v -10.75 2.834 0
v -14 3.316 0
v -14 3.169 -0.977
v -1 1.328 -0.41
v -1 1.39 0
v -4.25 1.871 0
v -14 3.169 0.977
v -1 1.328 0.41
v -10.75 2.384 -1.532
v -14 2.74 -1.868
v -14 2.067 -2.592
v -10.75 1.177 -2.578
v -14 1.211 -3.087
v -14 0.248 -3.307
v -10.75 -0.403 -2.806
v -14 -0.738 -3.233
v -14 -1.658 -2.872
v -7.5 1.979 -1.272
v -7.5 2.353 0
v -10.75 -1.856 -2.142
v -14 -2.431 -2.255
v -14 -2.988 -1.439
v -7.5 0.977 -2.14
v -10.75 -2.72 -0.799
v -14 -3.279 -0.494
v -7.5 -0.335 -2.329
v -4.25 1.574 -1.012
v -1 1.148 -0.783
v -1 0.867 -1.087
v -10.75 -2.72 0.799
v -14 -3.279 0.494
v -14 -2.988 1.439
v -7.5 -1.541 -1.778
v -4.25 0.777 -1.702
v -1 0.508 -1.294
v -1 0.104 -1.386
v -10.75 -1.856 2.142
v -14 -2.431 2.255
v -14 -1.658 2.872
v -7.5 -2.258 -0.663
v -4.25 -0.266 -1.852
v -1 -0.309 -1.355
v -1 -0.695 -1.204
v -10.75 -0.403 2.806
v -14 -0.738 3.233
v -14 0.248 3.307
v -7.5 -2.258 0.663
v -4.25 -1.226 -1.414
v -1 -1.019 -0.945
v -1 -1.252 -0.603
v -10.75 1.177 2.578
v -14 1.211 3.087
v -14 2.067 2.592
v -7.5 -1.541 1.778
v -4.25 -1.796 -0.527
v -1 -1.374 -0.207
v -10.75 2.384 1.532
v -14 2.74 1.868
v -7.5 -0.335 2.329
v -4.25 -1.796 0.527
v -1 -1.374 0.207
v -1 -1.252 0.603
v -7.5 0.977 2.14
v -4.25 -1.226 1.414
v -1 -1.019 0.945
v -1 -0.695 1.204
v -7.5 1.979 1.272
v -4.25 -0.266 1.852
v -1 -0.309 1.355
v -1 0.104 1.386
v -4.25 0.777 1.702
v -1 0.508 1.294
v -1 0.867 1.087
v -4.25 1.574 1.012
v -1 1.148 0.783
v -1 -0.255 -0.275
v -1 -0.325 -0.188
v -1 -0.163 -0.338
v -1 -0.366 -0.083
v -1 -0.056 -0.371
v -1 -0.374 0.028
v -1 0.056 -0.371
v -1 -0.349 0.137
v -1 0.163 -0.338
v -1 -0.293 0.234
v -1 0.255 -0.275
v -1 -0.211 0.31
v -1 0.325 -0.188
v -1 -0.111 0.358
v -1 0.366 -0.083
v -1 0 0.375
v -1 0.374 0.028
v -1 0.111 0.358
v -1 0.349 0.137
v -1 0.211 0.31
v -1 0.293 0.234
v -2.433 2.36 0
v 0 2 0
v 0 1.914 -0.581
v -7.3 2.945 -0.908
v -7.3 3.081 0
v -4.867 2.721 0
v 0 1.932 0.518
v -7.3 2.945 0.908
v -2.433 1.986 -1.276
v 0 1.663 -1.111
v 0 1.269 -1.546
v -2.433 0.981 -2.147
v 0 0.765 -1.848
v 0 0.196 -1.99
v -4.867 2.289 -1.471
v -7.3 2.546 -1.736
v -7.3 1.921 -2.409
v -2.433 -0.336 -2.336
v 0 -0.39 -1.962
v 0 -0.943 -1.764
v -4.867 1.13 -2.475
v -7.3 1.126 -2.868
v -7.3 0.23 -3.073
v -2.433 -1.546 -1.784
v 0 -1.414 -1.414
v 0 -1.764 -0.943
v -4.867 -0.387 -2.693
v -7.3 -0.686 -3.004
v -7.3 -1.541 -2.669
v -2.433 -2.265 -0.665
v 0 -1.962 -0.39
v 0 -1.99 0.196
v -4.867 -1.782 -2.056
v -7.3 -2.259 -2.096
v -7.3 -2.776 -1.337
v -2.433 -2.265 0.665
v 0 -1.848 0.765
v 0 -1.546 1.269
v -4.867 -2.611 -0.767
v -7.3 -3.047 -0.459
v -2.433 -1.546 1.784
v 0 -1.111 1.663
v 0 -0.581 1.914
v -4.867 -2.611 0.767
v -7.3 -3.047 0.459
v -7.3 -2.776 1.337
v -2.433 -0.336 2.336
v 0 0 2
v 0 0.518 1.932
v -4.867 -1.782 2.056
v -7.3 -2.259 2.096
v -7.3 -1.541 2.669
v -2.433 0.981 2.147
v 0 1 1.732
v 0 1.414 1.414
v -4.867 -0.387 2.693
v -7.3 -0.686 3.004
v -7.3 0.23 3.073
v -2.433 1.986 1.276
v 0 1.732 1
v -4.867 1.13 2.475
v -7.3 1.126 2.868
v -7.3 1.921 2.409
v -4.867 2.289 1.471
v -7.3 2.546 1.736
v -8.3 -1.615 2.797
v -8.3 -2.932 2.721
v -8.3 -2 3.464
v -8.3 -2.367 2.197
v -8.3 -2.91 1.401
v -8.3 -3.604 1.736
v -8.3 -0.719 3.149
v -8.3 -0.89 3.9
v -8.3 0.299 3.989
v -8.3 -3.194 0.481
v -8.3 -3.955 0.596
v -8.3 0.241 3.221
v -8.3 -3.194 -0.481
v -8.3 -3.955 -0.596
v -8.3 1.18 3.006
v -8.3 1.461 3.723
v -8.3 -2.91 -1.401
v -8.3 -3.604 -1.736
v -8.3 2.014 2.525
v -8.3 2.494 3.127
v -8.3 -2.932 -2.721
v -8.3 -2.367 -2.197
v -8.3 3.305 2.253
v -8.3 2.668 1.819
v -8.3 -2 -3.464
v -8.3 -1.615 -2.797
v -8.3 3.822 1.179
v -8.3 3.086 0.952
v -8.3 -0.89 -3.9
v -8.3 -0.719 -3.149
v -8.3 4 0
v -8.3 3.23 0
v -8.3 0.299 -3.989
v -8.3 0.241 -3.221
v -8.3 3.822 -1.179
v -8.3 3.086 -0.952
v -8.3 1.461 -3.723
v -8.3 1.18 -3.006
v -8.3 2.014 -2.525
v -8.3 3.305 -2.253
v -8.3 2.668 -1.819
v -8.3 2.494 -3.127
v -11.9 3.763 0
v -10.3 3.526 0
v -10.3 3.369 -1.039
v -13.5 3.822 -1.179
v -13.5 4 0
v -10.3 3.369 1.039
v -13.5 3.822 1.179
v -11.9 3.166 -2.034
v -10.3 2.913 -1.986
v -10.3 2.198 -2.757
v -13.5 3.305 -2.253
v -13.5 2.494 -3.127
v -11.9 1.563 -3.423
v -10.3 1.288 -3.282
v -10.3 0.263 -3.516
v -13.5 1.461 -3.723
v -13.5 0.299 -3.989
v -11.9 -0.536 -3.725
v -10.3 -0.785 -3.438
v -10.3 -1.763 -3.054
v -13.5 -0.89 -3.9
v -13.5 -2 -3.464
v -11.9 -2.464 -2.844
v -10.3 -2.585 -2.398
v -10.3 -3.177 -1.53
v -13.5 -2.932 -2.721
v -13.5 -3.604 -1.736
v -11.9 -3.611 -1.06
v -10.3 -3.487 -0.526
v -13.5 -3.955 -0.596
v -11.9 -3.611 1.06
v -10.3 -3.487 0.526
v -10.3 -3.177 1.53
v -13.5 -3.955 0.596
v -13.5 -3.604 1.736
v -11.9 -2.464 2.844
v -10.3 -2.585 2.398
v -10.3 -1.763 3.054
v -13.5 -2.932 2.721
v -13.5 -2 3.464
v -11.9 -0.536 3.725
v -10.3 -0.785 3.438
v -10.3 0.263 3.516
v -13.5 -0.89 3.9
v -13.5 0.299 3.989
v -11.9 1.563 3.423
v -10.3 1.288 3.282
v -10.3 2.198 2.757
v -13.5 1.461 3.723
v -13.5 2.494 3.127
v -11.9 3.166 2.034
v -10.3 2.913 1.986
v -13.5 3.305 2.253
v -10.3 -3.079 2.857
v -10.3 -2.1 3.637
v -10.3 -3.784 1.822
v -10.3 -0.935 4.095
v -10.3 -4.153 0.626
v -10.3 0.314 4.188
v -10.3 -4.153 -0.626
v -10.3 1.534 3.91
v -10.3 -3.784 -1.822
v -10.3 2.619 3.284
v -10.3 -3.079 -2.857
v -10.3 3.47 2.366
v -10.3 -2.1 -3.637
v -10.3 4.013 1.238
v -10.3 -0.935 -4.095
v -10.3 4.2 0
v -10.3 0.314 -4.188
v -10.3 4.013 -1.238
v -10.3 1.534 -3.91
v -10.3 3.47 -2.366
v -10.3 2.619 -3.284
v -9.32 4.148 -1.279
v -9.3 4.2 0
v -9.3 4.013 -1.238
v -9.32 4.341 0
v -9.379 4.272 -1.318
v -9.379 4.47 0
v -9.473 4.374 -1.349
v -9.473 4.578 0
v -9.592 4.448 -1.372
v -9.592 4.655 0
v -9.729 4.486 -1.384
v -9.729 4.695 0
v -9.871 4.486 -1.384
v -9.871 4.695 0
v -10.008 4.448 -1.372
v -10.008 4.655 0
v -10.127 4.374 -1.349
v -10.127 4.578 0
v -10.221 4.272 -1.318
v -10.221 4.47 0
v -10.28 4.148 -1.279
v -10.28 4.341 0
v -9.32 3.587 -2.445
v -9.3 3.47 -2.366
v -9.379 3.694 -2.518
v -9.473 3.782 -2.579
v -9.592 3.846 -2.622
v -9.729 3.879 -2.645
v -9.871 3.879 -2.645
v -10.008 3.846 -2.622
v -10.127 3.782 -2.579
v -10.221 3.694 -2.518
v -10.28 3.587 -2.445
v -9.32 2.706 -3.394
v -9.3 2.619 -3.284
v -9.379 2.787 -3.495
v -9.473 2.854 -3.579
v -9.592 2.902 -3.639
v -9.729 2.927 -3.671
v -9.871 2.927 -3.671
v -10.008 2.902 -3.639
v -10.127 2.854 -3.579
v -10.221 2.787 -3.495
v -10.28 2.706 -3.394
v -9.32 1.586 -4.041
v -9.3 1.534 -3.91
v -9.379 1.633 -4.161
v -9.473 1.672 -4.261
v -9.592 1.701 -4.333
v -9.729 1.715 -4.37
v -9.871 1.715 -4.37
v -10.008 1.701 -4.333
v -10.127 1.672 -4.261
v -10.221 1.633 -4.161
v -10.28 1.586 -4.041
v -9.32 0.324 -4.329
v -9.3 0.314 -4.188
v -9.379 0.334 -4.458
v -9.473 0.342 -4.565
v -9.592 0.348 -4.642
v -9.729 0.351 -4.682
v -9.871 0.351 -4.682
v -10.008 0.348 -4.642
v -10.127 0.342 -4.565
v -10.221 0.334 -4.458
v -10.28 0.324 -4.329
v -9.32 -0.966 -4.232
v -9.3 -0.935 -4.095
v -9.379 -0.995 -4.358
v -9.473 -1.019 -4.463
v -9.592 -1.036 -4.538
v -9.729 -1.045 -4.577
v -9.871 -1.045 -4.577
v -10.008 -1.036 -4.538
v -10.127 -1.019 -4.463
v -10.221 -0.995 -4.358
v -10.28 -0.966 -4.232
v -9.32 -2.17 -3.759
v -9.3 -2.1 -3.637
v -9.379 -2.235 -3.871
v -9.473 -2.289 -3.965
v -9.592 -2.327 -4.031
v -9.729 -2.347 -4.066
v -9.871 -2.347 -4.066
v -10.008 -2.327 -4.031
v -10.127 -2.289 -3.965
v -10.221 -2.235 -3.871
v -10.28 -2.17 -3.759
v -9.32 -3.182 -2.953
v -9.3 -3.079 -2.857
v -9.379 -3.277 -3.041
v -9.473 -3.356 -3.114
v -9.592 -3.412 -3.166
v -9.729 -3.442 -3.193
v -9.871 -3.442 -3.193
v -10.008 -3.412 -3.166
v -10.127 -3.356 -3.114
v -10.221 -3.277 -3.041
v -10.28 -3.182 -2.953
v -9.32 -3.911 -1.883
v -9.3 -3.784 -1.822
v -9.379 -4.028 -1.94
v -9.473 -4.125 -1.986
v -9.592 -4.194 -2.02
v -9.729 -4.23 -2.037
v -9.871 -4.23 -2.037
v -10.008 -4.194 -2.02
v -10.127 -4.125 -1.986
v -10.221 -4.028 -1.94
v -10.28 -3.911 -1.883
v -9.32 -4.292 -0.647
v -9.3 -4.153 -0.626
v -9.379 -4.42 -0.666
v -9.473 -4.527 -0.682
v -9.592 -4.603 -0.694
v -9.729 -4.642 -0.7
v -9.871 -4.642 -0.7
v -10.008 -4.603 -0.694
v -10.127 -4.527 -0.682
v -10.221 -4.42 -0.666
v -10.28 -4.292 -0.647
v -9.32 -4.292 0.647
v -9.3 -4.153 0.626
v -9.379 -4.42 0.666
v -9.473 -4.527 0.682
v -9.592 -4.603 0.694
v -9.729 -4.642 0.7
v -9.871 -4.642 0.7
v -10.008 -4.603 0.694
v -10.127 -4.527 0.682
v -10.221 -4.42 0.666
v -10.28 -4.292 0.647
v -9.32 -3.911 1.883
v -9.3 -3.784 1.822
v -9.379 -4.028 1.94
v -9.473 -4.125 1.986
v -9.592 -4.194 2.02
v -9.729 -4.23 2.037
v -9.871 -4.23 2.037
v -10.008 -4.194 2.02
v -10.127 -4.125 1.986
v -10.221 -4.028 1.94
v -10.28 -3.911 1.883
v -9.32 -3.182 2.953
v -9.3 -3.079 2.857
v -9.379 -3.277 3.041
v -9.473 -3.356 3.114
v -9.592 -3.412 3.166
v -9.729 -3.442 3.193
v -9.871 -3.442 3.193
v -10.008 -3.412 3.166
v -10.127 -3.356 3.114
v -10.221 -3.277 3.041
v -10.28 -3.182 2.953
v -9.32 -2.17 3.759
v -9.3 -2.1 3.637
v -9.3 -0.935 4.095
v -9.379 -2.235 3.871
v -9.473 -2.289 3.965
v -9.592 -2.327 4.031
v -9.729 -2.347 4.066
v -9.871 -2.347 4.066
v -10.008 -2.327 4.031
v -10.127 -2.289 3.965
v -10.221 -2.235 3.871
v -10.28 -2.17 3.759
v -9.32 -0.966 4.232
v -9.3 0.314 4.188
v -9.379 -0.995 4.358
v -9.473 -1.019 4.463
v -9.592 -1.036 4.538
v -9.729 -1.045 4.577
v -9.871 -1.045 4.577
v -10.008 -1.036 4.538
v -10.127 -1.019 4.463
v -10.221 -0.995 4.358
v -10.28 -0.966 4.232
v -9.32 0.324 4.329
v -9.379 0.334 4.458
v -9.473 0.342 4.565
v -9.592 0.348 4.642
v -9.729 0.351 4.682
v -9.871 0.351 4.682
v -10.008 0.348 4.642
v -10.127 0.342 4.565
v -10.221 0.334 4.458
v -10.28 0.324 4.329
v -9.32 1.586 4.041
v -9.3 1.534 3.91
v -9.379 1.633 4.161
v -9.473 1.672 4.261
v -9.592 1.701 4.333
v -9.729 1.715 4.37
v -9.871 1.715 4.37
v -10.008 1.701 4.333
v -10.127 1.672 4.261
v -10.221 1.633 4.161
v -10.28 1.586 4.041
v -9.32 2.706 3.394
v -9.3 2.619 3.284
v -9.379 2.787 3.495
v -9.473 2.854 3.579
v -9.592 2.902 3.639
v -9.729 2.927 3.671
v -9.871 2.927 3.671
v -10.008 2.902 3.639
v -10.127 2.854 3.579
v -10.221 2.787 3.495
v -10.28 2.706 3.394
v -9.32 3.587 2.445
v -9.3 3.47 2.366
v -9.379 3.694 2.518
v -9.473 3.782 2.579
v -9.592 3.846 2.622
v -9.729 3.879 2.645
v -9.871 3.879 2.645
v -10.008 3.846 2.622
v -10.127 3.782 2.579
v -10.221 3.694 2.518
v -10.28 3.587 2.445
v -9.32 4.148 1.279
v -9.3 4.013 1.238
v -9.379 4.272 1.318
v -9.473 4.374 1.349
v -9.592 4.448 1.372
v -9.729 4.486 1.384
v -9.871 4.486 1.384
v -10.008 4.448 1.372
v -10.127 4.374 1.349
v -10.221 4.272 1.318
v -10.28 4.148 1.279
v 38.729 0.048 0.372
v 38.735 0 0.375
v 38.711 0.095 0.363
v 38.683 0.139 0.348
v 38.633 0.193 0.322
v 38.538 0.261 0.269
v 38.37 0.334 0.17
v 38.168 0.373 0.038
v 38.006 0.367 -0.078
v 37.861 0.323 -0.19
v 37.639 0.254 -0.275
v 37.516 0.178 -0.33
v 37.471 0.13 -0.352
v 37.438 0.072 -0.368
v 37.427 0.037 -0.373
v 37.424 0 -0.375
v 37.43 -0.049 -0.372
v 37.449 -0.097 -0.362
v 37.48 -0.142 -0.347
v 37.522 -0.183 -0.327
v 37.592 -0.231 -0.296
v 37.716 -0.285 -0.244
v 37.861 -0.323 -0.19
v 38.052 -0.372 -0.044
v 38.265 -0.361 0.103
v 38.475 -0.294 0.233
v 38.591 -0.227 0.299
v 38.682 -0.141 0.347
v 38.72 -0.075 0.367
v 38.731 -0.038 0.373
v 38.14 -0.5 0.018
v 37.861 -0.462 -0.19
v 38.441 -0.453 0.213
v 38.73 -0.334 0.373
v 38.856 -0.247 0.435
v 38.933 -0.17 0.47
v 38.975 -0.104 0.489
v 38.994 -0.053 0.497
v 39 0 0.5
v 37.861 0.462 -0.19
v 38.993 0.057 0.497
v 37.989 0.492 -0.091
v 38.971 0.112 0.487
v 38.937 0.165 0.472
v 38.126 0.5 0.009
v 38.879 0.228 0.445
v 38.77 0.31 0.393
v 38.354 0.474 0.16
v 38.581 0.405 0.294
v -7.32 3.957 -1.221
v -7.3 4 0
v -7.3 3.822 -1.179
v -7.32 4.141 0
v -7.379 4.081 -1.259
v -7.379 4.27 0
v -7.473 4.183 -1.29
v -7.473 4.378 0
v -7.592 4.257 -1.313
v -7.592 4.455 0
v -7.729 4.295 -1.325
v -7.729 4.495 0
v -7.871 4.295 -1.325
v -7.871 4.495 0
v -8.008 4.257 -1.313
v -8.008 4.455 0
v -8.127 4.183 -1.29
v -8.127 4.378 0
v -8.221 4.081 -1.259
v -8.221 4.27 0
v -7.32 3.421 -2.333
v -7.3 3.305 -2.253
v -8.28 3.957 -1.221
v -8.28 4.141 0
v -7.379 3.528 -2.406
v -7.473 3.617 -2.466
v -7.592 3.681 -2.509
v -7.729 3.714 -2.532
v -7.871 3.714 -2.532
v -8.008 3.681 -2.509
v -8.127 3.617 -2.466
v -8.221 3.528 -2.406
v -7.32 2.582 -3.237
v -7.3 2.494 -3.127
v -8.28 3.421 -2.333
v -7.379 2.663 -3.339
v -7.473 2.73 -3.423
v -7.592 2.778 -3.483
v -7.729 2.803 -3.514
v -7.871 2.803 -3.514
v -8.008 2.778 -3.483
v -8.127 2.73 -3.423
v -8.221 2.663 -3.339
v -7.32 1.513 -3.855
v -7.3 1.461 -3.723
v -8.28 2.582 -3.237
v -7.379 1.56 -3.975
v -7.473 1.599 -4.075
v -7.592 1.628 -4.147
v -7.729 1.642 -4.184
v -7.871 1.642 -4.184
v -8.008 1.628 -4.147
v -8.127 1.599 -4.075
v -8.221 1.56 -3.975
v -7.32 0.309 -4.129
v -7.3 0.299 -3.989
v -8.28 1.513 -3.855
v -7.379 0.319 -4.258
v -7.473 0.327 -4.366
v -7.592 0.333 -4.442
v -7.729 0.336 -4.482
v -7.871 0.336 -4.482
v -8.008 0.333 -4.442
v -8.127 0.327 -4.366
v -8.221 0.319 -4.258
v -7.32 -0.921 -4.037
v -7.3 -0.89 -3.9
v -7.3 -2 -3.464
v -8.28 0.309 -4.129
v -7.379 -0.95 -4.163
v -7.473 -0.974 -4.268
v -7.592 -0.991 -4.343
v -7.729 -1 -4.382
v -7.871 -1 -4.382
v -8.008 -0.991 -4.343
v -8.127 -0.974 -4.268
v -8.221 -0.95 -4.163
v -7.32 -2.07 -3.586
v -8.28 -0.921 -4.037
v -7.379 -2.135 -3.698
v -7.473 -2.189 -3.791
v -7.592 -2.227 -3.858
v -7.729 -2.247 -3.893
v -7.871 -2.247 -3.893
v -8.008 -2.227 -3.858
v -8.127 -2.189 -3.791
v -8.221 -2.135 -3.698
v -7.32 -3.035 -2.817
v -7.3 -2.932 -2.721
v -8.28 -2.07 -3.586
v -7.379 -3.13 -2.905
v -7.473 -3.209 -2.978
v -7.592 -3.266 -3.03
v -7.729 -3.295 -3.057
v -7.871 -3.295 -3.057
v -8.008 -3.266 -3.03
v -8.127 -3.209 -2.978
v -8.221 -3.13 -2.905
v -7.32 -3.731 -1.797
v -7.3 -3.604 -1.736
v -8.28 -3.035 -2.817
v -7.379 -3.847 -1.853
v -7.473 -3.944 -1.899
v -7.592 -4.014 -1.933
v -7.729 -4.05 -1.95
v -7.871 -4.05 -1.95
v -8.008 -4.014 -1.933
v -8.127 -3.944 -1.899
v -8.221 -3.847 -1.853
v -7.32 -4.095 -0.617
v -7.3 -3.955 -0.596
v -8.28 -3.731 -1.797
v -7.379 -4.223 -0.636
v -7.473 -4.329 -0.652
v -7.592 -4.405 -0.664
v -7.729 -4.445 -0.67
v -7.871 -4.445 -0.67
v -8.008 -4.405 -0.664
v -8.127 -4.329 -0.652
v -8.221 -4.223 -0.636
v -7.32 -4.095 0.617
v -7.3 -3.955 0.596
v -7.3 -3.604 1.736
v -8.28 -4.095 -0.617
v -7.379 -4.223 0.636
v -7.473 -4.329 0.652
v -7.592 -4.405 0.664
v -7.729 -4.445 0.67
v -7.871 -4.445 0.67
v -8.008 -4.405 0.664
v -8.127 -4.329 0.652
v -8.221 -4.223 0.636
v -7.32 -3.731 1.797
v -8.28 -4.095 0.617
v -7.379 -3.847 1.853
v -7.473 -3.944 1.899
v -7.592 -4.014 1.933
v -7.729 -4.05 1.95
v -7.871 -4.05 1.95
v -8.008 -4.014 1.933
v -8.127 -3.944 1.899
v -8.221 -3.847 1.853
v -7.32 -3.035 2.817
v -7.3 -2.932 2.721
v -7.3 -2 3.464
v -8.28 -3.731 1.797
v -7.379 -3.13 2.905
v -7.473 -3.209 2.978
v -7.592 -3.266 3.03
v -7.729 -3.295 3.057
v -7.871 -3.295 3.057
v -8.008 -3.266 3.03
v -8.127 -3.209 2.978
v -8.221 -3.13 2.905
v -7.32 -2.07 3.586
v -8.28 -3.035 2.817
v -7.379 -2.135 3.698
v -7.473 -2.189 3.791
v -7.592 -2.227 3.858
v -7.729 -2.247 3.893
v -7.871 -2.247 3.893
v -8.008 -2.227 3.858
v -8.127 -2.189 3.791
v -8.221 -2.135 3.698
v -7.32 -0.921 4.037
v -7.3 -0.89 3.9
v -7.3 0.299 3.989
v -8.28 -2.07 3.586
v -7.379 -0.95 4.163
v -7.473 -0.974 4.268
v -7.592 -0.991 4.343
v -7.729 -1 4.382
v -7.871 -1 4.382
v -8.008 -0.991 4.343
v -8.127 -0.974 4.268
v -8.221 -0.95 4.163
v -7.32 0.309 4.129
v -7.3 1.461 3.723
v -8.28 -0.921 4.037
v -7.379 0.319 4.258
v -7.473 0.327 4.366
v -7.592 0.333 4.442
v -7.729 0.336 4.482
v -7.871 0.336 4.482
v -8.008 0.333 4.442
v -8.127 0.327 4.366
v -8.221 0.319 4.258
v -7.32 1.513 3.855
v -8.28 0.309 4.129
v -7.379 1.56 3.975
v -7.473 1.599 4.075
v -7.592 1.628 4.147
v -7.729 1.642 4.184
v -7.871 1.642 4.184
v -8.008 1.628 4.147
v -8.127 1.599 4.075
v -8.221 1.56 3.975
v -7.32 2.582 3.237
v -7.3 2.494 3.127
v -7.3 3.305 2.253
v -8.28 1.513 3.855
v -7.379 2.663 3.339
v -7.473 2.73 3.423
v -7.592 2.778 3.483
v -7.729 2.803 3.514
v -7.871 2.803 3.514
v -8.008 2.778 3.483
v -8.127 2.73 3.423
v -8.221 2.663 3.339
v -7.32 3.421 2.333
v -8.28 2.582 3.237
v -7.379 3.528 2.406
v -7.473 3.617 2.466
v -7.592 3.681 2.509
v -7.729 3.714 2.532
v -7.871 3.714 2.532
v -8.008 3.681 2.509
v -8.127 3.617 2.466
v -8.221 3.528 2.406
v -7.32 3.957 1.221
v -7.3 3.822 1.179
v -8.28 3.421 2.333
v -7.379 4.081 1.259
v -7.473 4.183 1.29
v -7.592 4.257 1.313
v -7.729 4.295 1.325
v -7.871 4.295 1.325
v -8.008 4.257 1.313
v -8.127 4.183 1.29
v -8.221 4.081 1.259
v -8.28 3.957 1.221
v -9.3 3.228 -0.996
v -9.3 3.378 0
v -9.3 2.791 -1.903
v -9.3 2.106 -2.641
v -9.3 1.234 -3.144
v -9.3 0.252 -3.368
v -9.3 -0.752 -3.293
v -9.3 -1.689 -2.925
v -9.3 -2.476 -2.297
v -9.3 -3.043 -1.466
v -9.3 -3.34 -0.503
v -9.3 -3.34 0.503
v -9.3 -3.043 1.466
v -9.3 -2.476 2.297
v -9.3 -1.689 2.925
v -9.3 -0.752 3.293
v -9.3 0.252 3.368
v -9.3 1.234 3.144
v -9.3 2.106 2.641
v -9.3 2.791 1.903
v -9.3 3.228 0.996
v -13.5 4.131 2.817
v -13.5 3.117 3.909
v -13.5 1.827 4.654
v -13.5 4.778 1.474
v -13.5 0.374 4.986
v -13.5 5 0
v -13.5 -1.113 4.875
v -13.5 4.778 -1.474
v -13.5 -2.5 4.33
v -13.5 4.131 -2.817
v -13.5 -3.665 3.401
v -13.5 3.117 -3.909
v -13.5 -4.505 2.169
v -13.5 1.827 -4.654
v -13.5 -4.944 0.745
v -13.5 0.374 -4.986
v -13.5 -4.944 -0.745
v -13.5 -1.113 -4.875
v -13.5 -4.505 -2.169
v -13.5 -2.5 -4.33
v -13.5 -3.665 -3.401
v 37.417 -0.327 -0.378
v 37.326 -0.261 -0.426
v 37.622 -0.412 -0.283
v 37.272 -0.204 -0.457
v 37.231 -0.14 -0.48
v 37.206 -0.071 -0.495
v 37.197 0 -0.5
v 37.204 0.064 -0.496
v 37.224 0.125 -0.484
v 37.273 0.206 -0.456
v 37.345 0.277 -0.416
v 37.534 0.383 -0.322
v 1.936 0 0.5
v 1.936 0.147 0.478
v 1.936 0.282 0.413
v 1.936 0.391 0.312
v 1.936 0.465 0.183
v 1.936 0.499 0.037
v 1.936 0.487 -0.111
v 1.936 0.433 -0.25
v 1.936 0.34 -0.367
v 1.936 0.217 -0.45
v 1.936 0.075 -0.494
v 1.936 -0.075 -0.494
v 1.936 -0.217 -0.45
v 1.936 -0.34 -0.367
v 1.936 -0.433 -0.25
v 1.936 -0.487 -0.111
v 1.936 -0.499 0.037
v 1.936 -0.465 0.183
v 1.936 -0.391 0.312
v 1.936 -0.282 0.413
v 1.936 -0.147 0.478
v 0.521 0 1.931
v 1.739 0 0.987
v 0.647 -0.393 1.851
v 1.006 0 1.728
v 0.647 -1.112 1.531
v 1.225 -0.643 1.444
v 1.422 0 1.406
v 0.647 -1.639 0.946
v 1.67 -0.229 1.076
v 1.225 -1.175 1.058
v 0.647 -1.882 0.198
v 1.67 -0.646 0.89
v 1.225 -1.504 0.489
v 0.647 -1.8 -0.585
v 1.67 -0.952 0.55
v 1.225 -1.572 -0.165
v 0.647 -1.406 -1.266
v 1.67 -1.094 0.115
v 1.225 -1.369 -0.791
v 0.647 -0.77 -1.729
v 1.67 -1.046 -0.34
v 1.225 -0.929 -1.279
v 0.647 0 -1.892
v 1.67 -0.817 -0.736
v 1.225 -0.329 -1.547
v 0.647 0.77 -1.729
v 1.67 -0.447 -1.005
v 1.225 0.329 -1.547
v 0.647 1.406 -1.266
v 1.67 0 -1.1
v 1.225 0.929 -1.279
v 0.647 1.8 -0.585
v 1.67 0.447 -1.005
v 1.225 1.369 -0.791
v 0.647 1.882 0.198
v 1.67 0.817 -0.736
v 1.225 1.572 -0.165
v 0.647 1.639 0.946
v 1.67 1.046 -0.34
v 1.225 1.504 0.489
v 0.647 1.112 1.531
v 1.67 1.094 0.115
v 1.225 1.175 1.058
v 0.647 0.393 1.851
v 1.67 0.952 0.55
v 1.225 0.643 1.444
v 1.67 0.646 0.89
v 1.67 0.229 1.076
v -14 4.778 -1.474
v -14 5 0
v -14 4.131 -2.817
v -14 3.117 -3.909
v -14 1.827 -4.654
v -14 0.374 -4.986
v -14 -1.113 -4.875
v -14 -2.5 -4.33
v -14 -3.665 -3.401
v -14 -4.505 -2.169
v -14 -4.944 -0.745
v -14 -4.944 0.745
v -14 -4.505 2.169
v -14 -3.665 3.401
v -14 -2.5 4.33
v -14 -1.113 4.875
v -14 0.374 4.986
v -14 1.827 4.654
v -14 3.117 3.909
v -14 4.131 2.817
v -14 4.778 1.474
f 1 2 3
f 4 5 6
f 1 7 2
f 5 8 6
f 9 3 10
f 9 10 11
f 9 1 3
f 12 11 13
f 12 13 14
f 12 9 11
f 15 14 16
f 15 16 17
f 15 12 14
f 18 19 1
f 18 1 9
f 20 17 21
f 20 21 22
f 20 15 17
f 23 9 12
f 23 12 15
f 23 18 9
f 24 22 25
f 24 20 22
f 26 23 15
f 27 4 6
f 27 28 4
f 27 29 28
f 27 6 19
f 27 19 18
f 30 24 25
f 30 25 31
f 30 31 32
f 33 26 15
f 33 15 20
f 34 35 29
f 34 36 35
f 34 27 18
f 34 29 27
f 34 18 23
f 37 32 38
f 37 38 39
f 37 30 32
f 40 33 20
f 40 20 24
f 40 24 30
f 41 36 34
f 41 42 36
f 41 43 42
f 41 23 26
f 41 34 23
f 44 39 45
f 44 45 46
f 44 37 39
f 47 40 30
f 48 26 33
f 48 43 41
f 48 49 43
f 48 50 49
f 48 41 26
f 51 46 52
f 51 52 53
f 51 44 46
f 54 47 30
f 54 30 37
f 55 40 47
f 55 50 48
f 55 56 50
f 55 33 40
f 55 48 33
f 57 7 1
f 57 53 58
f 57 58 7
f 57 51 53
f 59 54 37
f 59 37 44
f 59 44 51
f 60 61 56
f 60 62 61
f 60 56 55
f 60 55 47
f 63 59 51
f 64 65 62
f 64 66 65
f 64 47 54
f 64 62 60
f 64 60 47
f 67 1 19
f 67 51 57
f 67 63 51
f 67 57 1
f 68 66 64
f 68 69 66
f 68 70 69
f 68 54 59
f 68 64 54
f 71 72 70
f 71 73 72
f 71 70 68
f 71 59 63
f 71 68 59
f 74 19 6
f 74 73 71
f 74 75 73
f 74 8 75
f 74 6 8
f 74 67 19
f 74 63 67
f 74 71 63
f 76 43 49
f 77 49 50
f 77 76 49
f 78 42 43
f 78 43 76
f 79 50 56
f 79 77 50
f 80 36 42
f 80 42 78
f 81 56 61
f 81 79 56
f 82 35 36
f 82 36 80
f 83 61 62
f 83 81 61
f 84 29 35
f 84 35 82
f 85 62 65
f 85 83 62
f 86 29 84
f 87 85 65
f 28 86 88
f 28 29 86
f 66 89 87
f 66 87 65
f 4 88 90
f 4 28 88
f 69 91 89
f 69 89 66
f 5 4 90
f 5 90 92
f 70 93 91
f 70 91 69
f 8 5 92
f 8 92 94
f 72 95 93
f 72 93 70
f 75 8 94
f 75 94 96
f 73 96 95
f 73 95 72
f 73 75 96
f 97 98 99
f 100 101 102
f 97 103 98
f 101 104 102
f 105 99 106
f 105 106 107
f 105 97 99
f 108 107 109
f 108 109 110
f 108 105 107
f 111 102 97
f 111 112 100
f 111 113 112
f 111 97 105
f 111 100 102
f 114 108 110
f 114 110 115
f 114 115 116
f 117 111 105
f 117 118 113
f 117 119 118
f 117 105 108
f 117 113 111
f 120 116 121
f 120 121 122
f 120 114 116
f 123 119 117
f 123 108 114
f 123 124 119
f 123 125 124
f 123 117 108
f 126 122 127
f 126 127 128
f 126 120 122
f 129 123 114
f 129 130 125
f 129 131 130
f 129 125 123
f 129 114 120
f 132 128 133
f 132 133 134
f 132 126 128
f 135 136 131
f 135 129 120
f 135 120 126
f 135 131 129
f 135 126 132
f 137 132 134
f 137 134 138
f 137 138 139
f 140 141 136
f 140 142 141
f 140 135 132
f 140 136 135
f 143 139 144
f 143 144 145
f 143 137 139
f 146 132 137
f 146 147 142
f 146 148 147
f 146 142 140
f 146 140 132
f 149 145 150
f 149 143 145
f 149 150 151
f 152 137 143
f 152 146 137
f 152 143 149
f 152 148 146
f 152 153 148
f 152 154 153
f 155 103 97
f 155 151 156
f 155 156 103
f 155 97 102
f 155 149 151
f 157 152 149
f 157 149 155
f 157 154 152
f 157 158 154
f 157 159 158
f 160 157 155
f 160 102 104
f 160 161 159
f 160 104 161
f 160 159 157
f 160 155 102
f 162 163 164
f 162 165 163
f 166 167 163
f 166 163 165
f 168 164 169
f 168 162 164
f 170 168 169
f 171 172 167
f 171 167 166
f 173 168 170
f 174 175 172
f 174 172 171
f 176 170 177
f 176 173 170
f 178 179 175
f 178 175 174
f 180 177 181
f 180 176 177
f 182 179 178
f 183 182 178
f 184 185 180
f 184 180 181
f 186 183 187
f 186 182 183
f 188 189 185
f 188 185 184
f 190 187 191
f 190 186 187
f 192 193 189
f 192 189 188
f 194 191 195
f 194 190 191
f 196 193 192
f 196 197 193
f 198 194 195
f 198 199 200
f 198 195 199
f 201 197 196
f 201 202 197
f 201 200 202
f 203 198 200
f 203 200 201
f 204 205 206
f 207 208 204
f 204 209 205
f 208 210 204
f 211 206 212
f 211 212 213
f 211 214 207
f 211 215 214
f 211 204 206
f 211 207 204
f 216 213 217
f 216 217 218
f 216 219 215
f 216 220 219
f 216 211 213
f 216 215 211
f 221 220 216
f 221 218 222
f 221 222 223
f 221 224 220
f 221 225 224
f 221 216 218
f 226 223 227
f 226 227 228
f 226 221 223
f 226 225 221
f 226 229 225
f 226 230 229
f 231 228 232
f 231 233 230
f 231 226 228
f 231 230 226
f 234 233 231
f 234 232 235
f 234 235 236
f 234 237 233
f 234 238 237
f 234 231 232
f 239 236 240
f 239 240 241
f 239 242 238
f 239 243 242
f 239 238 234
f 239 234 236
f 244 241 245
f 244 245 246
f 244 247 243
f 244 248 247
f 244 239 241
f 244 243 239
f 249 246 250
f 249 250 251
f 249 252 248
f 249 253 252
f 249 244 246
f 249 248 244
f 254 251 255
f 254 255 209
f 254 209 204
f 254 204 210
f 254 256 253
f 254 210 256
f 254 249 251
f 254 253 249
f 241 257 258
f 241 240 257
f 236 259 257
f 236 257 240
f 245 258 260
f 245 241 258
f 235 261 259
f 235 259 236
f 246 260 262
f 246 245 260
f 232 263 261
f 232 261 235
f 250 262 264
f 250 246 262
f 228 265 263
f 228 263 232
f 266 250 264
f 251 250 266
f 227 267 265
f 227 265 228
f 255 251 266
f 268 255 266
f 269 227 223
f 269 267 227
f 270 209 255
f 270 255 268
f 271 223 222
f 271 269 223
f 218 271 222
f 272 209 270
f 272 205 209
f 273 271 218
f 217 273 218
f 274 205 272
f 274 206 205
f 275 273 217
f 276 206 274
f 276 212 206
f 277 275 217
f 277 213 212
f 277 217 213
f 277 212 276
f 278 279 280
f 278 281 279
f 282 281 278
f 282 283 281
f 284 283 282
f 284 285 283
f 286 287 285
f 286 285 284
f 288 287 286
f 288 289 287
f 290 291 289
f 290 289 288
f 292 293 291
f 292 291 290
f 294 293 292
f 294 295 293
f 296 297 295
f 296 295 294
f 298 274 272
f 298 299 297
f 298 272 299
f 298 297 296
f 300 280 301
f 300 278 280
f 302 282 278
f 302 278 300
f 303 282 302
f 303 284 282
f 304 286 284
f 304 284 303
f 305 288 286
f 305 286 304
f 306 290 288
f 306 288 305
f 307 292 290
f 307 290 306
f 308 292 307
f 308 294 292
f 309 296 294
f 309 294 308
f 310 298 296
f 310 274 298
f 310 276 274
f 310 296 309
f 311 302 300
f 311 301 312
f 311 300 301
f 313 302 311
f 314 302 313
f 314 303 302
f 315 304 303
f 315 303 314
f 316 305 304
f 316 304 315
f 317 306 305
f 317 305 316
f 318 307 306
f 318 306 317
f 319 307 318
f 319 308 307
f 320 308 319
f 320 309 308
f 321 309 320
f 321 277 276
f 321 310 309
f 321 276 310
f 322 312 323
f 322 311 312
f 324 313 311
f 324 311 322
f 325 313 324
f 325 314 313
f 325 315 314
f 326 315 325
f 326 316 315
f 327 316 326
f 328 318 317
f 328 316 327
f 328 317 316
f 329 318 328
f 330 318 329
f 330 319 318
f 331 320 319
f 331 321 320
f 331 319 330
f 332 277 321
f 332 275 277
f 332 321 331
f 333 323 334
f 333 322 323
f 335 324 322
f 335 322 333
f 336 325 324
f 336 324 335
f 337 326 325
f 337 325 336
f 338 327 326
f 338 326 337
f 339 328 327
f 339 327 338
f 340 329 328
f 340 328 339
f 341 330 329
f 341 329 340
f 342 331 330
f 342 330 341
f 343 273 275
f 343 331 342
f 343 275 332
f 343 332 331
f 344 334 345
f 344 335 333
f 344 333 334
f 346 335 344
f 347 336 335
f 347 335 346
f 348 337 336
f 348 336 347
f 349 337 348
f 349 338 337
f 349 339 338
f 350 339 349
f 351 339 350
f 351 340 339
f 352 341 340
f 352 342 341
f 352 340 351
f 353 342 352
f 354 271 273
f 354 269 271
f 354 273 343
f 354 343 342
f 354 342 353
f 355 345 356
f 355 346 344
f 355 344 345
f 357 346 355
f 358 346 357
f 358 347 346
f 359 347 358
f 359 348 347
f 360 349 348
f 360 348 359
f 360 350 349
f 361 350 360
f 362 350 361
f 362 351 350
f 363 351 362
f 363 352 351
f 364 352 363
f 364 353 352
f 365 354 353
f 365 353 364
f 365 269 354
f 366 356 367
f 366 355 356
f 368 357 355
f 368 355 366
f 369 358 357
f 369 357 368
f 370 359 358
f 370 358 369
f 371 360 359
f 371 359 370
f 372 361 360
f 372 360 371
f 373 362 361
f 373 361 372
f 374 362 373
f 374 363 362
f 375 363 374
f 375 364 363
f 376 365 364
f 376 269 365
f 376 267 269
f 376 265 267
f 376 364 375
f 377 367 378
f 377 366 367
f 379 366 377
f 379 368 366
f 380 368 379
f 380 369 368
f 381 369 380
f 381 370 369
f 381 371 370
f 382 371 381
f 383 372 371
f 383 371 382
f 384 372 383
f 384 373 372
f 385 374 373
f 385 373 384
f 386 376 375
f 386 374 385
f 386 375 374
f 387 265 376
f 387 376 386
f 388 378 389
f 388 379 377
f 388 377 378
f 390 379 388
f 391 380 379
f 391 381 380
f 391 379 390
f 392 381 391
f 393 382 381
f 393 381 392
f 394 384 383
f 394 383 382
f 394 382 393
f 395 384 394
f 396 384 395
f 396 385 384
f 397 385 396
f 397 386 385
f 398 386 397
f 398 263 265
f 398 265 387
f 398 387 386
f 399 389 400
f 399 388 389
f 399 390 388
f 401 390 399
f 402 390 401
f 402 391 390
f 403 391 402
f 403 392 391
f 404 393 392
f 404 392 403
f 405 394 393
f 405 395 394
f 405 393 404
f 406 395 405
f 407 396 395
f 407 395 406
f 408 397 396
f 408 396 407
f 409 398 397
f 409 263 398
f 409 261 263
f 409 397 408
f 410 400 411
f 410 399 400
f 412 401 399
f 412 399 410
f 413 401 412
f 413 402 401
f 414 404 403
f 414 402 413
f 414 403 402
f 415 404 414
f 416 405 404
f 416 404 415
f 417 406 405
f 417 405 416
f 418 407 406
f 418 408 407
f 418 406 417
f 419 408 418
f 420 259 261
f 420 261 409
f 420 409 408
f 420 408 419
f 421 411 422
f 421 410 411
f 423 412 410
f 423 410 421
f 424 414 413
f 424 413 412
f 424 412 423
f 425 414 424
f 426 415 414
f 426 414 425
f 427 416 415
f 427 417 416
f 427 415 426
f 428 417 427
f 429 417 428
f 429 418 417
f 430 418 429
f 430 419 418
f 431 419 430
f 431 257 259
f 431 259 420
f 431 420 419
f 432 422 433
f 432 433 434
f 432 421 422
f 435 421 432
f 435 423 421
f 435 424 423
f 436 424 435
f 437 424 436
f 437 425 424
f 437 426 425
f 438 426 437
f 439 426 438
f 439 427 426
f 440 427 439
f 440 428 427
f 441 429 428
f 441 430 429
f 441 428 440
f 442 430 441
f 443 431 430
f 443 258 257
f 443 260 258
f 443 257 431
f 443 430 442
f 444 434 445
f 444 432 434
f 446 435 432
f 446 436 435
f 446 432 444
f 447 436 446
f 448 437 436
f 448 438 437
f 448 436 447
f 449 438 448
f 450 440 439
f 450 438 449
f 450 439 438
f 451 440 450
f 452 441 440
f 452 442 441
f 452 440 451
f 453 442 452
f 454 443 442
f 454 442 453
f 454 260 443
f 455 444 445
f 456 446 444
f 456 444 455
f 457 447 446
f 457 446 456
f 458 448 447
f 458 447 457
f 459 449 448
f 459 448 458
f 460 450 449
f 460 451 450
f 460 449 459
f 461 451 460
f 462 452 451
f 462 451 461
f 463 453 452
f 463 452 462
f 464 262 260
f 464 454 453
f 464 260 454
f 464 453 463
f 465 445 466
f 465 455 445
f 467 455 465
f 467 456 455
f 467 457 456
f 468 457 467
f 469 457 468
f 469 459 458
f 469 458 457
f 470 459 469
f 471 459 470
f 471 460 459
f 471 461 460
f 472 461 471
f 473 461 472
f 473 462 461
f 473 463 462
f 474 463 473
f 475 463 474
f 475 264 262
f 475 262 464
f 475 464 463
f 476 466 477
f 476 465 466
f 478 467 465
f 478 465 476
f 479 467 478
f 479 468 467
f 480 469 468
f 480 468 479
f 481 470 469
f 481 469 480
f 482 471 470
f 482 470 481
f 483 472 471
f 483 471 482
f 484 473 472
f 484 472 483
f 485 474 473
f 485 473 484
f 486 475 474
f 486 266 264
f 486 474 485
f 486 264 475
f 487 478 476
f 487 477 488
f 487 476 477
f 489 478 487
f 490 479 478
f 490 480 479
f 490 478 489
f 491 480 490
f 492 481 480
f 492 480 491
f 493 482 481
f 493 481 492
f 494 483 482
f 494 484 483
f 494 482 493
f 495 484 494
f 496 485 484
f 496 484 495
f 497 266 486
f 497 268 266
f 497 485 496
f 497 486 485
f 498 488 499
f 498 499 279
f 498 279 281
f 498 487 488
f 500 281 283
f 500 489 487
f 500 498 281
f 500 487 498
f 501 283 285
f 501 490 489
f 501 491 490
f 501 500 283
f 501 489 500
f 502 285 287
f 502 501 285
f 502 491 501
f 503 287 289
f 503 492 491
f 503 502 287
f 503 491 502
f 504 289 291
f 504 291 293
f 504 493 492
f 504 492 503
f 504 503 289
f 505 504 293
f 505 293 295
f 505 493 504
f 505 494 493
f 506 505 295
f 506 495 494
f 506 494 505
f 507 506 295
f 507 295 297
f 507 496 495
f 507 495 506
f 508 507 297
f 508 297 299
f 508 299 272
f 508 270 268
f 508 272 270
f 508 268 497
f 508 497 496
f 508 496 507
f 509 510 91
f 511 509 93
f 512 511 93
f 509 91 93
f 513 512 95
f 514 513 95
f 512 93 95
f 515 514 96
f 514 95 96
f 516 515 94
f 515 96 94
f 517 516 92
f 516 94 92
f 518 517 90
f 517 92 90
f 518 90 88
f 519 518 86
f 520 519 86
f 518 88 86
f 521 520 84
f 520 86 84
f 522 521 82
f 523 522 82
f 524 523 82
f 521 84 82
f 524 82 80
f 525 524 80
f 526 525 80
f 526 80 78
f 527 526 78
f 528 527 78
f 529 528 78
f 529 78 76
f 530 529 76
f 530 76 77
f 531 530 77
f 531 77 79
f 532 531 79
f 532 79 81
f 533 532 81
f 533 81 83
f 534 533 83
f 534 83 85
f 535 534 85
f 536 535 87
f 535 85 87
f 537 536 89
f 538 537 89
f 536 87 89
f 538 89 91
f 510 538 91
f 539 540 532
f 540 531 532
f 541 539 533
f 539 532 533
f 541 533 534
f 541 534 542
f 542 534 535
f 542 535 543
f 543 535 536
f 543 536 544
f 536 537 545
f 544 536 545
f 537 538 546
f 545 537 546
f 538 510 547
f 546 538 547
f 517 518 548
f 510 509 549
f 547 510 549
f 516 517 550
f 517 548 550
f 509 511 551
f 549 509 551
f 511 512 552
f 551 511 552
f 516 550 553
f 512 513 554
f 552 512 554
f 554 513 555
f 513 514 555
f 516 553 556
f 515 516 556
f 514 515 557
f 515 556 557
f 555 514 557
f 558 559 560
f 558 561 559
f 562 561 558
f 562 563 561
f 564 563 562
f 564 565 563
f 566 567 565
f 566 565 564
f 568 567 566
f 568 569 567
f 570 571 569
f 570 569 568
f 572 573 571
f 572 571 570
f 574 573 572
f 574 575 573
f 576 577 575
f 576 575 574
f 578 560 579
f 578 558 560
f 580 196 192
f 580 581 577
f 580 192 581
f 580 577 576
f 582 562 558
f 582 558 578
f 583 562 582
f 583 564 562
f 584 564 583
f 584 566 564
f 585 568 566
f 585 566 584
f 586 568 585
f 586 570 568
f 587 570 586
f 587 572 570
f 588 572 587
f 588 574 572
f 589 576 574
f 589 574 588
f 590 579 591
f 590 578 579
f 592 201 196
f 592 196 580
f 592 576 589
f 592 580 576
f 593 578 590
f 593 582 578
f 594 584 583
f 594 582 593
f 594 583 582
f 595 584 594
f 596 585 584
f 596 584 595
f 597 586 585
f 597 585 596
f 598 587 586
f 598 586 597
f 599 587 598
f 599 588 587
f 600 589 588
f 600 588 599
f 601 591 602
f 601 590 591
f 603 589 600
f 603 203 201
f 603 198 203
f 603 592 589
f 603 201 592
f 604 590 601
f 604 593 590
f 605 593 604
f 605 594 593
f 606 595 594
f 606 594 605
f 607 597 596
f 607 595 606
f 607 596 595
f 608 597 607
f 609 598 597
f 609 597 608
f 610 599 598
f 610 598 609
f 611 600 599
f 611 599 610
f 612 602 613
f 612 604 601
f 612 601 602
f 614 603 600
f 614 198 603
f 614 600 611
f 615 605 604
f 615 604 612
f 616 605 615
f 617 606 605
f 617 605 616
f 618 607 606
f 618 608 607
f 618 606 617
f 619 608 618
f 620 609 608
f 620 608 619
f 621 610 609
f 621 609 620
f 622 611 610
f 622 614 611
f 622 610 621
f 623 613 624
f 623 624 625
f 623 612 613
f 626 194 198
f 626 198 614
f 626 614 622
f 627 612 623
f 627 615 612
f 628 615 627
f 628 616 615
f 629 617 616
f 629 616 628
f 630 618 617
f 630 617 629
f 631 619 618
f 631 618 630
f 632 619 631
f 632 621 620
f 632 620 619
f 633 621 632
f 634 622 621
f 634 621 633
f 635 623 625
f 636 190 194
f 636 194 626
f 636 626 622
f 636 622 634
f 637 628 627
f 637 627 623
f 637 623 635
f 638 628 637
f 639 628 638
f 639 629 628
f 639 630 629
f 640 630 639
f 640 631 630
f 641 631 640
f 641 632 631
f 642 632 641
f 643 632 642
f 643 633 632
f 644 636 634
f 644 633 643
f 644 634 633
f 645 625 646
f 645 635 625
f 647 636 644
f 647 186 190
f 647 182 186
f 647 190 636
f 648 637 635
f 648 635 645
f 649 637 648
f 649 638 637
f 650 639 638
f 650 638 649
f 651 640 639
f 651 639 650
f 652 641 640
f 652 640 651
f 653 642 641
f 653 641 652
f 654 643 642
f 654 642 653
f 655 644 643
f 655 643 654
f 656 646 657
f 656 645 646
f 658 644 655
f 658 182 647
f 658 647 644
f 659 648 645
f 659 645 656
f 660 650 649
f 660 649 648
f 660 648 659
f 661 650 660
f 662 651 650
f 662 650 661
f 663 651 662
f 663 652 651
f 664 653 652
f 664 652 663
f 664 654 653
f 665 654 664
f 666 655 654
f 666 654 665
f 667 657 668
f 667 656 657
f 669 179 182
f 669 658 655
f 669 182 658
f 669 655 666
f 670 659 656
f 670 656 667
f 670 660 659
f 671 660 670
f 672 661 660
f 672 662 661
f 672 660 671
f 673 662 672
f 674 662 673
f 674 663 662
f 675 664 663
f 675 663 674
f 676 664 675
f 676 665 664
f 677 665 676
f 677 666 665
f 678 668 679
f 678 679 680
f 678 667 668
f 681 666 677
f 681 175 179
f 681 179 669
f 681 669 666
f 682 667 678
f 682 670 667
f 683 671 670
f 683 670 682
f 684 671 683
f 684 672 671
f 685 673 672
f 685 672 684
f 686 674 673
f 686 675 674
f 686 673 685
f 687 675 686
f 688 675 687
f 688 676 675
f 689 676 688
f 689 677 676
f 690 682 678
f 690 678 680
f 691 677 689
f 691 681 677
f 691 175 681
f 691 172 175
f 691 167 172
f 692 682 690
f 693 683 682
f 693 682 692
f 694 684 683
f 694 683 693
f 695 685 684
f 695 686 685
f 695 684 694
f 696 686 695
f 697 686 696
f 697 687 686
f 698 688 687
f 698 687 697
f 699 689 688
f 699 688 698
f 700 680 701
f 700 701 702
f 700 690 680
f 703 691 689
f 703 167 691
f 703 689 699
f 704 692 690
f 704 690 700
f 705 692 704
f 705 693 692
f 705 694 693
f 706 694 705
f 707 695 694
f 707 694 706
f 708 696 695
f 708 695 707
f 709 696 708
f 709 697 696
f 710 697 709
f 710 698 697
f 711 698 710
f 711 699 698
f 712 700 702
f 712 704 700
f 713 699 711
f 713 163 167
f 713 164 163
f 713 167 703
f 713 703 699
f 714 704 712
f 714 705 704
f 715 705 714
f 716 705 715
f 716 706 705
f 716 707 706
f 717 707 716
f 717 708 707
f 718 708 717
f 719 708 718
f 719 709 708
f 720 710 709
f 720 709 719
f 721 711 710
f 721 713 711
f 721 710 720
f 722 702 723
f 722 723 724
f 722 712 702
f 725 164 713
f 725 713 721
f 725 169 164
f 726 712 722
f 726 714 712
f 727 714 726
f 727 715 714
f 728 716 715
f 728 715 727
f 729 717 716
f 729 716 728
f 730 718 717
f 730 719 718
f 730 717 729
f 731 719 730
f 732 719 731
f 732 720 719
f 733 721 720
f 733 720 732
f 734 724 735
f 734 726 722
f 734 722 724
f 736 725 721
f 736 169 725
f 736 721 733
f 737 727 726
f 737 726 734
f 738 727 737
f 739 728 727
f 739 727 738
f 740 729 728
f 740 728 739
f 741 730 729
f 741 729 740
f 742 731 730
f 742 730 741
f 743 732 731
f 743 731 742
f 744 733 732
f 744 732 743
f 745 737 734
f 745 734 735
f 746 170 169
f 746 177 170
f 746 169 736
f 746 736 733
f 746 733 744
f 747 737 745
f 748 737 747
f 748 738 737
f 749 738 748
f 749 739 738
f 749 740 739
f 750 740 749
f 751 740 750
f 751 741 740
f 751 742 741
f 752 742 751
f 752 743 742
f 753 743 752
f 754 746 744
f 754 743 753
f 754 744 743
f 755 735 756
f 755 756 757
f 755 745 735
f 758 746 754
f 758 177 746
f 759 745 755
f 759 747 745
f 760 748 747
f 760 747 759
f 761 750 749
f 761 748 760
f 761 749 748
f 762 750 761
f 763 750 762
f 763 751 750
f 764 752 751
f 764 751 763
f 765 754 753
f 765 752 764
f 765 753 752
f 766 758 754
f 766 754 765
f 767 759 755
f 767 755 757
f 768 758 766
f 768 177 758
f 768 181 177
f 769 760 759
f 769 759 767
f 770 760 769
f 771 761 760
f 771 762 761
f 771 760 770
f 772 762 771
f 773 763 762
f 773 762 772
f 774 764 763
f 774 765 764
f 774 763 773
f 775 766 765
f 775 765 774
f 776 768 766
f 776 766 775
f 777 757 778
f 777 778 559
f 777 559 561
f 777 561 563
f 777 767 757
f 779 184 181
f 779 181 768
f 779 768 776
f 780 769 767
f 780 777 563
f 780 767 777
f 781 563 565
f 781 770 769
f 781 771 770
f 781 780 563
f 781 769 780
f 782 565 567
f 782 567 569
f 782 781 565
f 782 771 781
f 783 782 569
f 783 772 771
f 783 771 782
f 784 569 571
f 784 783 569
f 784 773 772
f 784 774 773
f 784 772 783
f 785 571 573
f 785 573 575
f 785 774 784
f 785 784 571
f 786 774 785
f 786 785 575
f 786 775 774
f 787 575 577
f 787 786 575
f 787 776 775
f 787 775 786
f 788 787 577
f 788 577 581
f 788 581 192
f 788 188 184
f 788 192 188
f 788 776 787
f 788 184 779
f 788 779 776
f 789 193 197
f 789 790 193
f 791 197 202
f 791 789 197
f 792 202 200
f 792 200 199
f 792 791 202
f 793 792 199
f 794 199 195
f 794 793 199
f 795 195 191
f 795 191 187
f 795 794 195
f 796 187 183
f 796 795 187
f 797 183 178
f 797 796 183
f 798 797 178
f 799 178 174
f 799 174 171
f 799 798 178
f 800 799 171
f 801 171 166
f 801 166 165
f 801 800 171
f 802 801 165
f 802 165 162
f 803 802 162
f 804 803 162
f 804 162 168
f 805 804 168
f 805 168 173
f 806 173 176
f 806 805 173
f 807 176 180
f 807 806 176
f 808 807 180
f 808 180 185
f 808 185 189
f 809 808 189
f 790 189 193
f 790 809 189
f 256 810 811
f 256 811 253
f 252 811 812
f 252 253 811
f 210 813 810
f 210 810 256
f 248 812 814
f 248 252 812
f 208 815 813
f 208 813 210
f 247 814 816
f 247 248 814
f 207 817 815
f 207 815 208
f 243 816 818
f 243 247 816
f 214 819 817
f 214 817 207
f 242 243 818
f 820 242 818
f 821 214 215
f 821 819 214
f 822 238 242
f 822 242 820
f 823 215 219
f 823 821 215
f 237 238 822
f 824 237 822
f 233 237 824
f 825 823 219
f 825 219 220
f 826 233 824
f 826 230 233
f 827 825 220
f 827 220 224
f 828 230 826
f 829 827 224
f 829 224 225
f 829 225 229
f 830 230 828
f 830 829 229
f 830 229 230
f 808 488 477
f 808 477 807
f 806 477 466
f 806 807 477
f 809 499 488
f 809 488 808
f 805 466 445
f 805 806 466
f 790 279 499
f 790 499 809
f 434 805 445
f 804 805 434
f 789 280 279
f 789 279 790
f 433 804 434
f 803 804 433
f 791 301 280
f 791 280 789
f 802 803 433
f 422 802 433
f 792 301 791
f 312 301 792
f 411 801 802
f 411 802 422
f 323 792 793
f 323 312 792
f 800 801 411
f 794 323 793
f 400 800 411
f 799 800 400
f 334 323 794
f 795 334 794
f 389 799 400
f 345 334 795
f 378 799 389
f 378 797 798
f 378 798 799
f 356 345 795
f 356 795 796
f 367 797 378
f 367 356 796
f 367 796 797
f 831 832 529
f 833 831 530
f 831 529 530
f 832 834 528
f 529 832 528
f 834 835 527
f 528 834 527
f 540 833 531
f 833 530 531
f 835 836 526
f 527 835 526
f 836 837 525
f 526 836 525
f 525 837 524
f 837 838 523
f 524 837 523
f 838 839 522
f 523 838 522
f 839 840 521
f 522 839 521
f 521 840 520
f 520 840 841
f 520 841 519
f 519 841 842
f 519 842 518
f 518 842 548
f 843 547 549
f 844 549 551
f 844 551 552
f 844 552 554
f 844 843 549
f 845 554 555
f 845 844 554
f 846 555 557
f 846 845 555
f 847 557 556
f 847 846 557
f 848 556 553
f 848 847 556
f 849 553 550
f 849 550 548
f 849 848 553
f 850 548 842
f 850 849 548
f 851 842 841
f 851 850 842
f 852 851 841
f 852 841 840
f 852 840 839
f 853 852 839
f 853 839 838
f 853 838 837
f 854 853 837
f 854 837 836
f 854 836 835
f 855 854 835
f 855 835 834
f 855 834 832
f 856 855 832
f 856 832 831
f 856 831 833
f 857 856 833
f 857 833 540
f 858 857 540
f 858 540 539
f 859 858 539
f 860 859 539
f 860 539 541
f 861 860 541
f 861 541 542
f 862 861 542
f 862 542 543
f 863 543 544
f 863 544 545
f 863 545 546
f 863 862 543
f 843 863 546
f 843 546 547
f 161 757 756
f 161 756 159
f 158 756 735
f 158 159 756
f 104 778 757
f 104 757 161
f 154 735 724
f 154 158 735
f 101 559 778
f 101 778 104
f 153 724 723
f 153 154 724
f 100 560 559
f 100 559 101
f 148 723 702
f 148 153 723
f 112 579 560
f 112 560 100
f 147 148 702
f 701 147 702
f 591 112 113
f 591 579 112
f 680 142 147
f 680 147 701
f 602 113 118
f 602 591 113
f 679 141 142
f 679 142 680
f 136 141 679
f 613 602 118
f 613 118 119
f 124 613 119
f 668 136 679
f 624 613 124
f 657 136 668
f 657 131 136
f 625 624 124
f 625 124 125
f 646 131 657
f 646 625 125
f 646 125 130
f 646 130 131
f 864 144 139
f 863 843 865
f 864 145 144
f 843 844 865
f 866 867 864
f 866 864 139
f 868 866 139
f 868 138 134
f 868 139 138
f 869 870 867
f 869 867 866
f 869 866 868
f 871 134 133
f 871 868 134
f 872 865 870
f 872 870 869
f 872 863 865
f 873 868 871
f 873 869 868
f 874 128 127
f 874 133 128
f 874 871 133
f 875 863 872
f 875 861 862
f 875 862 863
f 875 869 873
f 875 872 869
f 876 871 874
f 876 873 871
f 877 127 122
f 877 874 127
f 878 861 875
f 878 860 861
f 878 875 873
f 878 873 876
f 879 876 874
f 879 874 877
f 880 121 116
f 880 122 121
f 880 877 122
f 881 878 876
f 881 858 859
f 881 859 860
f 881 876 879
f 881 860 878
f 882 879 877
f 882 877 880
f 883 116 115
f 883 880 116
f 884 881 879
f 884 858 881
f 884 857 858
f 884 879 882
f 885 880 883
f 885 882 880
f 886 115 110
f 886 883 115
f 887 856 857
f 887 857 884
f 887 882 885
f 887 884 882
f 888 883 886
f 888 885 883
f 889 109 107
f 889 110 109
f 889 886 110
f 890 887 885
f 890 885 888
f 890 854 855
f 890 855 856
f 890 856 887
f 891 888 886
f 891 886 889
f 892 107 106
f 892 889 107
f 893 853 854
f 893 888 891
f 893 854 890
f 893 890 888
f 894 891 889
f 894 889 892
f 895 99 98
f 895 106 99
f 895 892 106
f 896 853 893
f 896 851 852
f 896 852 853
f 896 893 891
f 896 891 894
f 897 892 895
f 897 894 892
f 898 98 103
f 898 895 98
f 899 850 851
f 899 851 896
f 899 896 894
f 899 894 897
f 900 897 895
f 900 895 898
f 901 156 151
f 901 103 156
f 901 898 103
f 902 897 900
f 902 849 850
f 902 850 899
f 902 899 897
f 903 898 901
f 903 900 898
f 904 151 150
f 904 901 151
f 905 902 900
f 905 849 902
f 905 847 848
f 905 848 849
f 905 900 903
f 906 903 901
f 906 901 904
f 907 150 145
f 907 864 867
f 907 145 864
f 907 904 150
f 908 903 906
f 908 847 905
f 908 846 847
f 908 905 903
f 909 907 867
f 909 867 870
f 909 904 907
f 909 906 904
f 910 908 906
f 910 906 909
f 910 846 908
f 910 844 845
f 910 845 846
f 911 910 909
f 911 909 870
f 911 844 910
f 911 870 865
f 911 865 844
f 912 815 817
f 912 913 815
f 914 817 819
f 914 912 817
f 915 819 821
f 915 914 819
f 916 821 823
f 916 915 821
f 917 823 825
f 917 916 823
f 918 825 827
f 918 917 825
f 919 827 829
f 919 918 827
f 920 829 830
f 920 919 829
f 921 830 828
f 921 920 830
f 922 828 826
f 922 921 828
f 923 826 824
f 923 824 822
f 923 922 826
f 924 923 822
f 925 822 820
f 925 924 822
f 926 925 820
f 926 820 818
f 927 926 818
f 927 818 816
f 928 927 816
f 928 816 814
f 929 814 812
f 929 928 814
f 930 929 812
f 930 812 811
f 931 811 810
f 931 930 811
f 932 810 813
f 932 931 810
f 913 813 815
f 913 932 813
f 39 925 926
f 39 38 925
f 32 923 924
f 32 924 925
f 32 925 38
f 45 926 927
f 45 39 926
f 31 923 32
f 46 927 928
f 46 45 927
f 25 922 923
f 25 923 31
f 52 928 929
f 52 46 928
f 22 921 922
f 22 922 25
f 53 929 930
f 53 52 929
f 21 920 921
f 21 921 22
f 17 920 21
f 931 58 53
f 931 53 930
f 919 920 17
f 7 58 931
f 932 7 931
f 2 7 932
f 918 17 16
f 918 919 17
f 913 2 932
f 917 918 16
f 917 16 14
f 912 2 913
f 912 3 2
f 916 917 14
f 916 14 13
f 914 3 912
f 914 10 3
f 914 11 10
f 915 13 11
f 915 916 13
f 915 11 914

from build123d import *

# Parameters (mm, degrees)
DOME1_FACE_RADIUS       = 2
DOME1_HEIGHT            = 2
SKETCH2_R               = 0.5
CUT_EXTRUDE1_DEPTH      = 4
SKETCH3_R               = 0.5
SKETCH3_R_2             = 0.375
EXTRUDE_THIN1_DEPTH     = 40
SKETCH4_R               = 3.5
CUT_EXTRUDE2_DEPTH      = 6
CUT_EXTRUDE2_DEPTH_BACK = 6
SKETCH6_R               = 5
CUT_EXTRUDE3_DEPTH      = 6
CUT_EXTRUDE3_DEPTH_BACK = 6


with BuildPart() as part:
    # Sketch1 → Revolve1 (revolve)
    with BuildSketch(Plane.XY):
        with BuildLine():
            Line((0, 0), (0, 2))
            Line((0, 2), (-7.3, 3.081481481))
            Line((-7.3, 3.081481481), (-7.3, 4))
            ThreePointArc((-7.3, 4), (-7.8, 4.5), (-8.3, 4))
            Line((-8.3, 4), (-8.3, 3.22962963))
            Line((-8.3, 3.22962963), (-9.3, 3.377777778))
            Line((-9.3, 3.377777778), (-9.3, 4.2))
            ThreePointArc((-9.3, 4.2), (-9.8, 4.7), (-10.3, 4.2))
            Line((-10.3, 4.2), (-10.3, 3.525925926))
            Line((-10.3, 3.525925926), (-13.5, 4))
            Line((-13.5, 4), (-13.5, 5))
            Line((-13.5, 5), (-14, 5))
            Line((-14, 5), (-14, 3.315888293))
            Line((-14, 3.315888293), (-1, 1.389962367))
            Line((-1, 1.389962367), (-1, 0))
            Line((-1, 0), (0, 0))
        make_face()
    revolve(axis=Axis((0, 0, 0), (-1, 0, 0)))

    # Dome1: a dome of height H over a round flat face of radius A is a cap of a sphere of radius (A * A + H * H) / (2 * H)
    dome1_r = (DOME1_FACE_RADIUS * DOME1_FACE_RADIUS + DOME1_HEIGHT * DOME1_HEIGHT) / (2 * DOME1_HEIGHT)
    dome1_base = Plane((0, 0, 0), z_dir=(1, 0, 0))
    with Locations(dome1_base.offset(DOME1_HEIGHT - dome1_r)):
        dome1_ball = Sphere(dome1_r, mode=Mode.PRIVATE)
    add(split(dome1_ball, bisect_by=dome1_base, keep=Keep.TOP, mode=Mode.PRIVATE))

    # Sketch2 → Cut-Extrude1 (cut, through all)
    with BuildSketch(Plane.ZY.offset(1)):
        Circle(SKETCH2_R)
    extrude(amount=-CUT_EXTRUDE1_DEPTH, mode=Mode.SUBTRACT)

    # Sketch3 → Extrude-Thin1 (add)
    with BuildSketch(Plane.ZY.offset(1)):
        Circle(SKETCH3_R)
        Circle(SKETCH3_R_2, mode=Mode.SUBTRACT)
    extrude(amount=-EXTRUDE_THIN1_DEPTH)

    # Sketch4 → Cut-Extrude2 (cut, two sides)
    with BuildSketch(Plane(origin=(0, 0, 0), x_dir=(1, 0, 0), z_dir=(0, 1, 0))) as cut_extrude2_sk:
        with Locations((39, 3.5)):
            Circle(SKETCH4_R)
    extrude(amount=CUT_EXTRUDE2_DEPTH, mode=Mode.SUBTRACT)
    extrude(cut_extrude2_sk.sketch, amount=-CUT_EXTRUDE2_DEPTH_BACK, mode=Mode.SUBTRACT)

    # Sketch6 → Cut-Extrude3 (cut, two sides)
    with BuildSketch(Plane(origin=(0, 0, 0), x_dir=(1, 0, 0), z_dir=(0, 1, 0))) as cut_extrude3_sk:
        with Locations((41, 4.082575695)):
            Circle(SKETCH6_R)
    extrude(amount=CUT_EXTRUDE3_DEPTH, mode=Mode.SUBTRACT)
    extrude(cut_extrude3_sk.sketch, amount=-CUT_EXTRUDE3_DEPTH_BACK, mode=Mode.SUBTRACT)


solid = part.part
